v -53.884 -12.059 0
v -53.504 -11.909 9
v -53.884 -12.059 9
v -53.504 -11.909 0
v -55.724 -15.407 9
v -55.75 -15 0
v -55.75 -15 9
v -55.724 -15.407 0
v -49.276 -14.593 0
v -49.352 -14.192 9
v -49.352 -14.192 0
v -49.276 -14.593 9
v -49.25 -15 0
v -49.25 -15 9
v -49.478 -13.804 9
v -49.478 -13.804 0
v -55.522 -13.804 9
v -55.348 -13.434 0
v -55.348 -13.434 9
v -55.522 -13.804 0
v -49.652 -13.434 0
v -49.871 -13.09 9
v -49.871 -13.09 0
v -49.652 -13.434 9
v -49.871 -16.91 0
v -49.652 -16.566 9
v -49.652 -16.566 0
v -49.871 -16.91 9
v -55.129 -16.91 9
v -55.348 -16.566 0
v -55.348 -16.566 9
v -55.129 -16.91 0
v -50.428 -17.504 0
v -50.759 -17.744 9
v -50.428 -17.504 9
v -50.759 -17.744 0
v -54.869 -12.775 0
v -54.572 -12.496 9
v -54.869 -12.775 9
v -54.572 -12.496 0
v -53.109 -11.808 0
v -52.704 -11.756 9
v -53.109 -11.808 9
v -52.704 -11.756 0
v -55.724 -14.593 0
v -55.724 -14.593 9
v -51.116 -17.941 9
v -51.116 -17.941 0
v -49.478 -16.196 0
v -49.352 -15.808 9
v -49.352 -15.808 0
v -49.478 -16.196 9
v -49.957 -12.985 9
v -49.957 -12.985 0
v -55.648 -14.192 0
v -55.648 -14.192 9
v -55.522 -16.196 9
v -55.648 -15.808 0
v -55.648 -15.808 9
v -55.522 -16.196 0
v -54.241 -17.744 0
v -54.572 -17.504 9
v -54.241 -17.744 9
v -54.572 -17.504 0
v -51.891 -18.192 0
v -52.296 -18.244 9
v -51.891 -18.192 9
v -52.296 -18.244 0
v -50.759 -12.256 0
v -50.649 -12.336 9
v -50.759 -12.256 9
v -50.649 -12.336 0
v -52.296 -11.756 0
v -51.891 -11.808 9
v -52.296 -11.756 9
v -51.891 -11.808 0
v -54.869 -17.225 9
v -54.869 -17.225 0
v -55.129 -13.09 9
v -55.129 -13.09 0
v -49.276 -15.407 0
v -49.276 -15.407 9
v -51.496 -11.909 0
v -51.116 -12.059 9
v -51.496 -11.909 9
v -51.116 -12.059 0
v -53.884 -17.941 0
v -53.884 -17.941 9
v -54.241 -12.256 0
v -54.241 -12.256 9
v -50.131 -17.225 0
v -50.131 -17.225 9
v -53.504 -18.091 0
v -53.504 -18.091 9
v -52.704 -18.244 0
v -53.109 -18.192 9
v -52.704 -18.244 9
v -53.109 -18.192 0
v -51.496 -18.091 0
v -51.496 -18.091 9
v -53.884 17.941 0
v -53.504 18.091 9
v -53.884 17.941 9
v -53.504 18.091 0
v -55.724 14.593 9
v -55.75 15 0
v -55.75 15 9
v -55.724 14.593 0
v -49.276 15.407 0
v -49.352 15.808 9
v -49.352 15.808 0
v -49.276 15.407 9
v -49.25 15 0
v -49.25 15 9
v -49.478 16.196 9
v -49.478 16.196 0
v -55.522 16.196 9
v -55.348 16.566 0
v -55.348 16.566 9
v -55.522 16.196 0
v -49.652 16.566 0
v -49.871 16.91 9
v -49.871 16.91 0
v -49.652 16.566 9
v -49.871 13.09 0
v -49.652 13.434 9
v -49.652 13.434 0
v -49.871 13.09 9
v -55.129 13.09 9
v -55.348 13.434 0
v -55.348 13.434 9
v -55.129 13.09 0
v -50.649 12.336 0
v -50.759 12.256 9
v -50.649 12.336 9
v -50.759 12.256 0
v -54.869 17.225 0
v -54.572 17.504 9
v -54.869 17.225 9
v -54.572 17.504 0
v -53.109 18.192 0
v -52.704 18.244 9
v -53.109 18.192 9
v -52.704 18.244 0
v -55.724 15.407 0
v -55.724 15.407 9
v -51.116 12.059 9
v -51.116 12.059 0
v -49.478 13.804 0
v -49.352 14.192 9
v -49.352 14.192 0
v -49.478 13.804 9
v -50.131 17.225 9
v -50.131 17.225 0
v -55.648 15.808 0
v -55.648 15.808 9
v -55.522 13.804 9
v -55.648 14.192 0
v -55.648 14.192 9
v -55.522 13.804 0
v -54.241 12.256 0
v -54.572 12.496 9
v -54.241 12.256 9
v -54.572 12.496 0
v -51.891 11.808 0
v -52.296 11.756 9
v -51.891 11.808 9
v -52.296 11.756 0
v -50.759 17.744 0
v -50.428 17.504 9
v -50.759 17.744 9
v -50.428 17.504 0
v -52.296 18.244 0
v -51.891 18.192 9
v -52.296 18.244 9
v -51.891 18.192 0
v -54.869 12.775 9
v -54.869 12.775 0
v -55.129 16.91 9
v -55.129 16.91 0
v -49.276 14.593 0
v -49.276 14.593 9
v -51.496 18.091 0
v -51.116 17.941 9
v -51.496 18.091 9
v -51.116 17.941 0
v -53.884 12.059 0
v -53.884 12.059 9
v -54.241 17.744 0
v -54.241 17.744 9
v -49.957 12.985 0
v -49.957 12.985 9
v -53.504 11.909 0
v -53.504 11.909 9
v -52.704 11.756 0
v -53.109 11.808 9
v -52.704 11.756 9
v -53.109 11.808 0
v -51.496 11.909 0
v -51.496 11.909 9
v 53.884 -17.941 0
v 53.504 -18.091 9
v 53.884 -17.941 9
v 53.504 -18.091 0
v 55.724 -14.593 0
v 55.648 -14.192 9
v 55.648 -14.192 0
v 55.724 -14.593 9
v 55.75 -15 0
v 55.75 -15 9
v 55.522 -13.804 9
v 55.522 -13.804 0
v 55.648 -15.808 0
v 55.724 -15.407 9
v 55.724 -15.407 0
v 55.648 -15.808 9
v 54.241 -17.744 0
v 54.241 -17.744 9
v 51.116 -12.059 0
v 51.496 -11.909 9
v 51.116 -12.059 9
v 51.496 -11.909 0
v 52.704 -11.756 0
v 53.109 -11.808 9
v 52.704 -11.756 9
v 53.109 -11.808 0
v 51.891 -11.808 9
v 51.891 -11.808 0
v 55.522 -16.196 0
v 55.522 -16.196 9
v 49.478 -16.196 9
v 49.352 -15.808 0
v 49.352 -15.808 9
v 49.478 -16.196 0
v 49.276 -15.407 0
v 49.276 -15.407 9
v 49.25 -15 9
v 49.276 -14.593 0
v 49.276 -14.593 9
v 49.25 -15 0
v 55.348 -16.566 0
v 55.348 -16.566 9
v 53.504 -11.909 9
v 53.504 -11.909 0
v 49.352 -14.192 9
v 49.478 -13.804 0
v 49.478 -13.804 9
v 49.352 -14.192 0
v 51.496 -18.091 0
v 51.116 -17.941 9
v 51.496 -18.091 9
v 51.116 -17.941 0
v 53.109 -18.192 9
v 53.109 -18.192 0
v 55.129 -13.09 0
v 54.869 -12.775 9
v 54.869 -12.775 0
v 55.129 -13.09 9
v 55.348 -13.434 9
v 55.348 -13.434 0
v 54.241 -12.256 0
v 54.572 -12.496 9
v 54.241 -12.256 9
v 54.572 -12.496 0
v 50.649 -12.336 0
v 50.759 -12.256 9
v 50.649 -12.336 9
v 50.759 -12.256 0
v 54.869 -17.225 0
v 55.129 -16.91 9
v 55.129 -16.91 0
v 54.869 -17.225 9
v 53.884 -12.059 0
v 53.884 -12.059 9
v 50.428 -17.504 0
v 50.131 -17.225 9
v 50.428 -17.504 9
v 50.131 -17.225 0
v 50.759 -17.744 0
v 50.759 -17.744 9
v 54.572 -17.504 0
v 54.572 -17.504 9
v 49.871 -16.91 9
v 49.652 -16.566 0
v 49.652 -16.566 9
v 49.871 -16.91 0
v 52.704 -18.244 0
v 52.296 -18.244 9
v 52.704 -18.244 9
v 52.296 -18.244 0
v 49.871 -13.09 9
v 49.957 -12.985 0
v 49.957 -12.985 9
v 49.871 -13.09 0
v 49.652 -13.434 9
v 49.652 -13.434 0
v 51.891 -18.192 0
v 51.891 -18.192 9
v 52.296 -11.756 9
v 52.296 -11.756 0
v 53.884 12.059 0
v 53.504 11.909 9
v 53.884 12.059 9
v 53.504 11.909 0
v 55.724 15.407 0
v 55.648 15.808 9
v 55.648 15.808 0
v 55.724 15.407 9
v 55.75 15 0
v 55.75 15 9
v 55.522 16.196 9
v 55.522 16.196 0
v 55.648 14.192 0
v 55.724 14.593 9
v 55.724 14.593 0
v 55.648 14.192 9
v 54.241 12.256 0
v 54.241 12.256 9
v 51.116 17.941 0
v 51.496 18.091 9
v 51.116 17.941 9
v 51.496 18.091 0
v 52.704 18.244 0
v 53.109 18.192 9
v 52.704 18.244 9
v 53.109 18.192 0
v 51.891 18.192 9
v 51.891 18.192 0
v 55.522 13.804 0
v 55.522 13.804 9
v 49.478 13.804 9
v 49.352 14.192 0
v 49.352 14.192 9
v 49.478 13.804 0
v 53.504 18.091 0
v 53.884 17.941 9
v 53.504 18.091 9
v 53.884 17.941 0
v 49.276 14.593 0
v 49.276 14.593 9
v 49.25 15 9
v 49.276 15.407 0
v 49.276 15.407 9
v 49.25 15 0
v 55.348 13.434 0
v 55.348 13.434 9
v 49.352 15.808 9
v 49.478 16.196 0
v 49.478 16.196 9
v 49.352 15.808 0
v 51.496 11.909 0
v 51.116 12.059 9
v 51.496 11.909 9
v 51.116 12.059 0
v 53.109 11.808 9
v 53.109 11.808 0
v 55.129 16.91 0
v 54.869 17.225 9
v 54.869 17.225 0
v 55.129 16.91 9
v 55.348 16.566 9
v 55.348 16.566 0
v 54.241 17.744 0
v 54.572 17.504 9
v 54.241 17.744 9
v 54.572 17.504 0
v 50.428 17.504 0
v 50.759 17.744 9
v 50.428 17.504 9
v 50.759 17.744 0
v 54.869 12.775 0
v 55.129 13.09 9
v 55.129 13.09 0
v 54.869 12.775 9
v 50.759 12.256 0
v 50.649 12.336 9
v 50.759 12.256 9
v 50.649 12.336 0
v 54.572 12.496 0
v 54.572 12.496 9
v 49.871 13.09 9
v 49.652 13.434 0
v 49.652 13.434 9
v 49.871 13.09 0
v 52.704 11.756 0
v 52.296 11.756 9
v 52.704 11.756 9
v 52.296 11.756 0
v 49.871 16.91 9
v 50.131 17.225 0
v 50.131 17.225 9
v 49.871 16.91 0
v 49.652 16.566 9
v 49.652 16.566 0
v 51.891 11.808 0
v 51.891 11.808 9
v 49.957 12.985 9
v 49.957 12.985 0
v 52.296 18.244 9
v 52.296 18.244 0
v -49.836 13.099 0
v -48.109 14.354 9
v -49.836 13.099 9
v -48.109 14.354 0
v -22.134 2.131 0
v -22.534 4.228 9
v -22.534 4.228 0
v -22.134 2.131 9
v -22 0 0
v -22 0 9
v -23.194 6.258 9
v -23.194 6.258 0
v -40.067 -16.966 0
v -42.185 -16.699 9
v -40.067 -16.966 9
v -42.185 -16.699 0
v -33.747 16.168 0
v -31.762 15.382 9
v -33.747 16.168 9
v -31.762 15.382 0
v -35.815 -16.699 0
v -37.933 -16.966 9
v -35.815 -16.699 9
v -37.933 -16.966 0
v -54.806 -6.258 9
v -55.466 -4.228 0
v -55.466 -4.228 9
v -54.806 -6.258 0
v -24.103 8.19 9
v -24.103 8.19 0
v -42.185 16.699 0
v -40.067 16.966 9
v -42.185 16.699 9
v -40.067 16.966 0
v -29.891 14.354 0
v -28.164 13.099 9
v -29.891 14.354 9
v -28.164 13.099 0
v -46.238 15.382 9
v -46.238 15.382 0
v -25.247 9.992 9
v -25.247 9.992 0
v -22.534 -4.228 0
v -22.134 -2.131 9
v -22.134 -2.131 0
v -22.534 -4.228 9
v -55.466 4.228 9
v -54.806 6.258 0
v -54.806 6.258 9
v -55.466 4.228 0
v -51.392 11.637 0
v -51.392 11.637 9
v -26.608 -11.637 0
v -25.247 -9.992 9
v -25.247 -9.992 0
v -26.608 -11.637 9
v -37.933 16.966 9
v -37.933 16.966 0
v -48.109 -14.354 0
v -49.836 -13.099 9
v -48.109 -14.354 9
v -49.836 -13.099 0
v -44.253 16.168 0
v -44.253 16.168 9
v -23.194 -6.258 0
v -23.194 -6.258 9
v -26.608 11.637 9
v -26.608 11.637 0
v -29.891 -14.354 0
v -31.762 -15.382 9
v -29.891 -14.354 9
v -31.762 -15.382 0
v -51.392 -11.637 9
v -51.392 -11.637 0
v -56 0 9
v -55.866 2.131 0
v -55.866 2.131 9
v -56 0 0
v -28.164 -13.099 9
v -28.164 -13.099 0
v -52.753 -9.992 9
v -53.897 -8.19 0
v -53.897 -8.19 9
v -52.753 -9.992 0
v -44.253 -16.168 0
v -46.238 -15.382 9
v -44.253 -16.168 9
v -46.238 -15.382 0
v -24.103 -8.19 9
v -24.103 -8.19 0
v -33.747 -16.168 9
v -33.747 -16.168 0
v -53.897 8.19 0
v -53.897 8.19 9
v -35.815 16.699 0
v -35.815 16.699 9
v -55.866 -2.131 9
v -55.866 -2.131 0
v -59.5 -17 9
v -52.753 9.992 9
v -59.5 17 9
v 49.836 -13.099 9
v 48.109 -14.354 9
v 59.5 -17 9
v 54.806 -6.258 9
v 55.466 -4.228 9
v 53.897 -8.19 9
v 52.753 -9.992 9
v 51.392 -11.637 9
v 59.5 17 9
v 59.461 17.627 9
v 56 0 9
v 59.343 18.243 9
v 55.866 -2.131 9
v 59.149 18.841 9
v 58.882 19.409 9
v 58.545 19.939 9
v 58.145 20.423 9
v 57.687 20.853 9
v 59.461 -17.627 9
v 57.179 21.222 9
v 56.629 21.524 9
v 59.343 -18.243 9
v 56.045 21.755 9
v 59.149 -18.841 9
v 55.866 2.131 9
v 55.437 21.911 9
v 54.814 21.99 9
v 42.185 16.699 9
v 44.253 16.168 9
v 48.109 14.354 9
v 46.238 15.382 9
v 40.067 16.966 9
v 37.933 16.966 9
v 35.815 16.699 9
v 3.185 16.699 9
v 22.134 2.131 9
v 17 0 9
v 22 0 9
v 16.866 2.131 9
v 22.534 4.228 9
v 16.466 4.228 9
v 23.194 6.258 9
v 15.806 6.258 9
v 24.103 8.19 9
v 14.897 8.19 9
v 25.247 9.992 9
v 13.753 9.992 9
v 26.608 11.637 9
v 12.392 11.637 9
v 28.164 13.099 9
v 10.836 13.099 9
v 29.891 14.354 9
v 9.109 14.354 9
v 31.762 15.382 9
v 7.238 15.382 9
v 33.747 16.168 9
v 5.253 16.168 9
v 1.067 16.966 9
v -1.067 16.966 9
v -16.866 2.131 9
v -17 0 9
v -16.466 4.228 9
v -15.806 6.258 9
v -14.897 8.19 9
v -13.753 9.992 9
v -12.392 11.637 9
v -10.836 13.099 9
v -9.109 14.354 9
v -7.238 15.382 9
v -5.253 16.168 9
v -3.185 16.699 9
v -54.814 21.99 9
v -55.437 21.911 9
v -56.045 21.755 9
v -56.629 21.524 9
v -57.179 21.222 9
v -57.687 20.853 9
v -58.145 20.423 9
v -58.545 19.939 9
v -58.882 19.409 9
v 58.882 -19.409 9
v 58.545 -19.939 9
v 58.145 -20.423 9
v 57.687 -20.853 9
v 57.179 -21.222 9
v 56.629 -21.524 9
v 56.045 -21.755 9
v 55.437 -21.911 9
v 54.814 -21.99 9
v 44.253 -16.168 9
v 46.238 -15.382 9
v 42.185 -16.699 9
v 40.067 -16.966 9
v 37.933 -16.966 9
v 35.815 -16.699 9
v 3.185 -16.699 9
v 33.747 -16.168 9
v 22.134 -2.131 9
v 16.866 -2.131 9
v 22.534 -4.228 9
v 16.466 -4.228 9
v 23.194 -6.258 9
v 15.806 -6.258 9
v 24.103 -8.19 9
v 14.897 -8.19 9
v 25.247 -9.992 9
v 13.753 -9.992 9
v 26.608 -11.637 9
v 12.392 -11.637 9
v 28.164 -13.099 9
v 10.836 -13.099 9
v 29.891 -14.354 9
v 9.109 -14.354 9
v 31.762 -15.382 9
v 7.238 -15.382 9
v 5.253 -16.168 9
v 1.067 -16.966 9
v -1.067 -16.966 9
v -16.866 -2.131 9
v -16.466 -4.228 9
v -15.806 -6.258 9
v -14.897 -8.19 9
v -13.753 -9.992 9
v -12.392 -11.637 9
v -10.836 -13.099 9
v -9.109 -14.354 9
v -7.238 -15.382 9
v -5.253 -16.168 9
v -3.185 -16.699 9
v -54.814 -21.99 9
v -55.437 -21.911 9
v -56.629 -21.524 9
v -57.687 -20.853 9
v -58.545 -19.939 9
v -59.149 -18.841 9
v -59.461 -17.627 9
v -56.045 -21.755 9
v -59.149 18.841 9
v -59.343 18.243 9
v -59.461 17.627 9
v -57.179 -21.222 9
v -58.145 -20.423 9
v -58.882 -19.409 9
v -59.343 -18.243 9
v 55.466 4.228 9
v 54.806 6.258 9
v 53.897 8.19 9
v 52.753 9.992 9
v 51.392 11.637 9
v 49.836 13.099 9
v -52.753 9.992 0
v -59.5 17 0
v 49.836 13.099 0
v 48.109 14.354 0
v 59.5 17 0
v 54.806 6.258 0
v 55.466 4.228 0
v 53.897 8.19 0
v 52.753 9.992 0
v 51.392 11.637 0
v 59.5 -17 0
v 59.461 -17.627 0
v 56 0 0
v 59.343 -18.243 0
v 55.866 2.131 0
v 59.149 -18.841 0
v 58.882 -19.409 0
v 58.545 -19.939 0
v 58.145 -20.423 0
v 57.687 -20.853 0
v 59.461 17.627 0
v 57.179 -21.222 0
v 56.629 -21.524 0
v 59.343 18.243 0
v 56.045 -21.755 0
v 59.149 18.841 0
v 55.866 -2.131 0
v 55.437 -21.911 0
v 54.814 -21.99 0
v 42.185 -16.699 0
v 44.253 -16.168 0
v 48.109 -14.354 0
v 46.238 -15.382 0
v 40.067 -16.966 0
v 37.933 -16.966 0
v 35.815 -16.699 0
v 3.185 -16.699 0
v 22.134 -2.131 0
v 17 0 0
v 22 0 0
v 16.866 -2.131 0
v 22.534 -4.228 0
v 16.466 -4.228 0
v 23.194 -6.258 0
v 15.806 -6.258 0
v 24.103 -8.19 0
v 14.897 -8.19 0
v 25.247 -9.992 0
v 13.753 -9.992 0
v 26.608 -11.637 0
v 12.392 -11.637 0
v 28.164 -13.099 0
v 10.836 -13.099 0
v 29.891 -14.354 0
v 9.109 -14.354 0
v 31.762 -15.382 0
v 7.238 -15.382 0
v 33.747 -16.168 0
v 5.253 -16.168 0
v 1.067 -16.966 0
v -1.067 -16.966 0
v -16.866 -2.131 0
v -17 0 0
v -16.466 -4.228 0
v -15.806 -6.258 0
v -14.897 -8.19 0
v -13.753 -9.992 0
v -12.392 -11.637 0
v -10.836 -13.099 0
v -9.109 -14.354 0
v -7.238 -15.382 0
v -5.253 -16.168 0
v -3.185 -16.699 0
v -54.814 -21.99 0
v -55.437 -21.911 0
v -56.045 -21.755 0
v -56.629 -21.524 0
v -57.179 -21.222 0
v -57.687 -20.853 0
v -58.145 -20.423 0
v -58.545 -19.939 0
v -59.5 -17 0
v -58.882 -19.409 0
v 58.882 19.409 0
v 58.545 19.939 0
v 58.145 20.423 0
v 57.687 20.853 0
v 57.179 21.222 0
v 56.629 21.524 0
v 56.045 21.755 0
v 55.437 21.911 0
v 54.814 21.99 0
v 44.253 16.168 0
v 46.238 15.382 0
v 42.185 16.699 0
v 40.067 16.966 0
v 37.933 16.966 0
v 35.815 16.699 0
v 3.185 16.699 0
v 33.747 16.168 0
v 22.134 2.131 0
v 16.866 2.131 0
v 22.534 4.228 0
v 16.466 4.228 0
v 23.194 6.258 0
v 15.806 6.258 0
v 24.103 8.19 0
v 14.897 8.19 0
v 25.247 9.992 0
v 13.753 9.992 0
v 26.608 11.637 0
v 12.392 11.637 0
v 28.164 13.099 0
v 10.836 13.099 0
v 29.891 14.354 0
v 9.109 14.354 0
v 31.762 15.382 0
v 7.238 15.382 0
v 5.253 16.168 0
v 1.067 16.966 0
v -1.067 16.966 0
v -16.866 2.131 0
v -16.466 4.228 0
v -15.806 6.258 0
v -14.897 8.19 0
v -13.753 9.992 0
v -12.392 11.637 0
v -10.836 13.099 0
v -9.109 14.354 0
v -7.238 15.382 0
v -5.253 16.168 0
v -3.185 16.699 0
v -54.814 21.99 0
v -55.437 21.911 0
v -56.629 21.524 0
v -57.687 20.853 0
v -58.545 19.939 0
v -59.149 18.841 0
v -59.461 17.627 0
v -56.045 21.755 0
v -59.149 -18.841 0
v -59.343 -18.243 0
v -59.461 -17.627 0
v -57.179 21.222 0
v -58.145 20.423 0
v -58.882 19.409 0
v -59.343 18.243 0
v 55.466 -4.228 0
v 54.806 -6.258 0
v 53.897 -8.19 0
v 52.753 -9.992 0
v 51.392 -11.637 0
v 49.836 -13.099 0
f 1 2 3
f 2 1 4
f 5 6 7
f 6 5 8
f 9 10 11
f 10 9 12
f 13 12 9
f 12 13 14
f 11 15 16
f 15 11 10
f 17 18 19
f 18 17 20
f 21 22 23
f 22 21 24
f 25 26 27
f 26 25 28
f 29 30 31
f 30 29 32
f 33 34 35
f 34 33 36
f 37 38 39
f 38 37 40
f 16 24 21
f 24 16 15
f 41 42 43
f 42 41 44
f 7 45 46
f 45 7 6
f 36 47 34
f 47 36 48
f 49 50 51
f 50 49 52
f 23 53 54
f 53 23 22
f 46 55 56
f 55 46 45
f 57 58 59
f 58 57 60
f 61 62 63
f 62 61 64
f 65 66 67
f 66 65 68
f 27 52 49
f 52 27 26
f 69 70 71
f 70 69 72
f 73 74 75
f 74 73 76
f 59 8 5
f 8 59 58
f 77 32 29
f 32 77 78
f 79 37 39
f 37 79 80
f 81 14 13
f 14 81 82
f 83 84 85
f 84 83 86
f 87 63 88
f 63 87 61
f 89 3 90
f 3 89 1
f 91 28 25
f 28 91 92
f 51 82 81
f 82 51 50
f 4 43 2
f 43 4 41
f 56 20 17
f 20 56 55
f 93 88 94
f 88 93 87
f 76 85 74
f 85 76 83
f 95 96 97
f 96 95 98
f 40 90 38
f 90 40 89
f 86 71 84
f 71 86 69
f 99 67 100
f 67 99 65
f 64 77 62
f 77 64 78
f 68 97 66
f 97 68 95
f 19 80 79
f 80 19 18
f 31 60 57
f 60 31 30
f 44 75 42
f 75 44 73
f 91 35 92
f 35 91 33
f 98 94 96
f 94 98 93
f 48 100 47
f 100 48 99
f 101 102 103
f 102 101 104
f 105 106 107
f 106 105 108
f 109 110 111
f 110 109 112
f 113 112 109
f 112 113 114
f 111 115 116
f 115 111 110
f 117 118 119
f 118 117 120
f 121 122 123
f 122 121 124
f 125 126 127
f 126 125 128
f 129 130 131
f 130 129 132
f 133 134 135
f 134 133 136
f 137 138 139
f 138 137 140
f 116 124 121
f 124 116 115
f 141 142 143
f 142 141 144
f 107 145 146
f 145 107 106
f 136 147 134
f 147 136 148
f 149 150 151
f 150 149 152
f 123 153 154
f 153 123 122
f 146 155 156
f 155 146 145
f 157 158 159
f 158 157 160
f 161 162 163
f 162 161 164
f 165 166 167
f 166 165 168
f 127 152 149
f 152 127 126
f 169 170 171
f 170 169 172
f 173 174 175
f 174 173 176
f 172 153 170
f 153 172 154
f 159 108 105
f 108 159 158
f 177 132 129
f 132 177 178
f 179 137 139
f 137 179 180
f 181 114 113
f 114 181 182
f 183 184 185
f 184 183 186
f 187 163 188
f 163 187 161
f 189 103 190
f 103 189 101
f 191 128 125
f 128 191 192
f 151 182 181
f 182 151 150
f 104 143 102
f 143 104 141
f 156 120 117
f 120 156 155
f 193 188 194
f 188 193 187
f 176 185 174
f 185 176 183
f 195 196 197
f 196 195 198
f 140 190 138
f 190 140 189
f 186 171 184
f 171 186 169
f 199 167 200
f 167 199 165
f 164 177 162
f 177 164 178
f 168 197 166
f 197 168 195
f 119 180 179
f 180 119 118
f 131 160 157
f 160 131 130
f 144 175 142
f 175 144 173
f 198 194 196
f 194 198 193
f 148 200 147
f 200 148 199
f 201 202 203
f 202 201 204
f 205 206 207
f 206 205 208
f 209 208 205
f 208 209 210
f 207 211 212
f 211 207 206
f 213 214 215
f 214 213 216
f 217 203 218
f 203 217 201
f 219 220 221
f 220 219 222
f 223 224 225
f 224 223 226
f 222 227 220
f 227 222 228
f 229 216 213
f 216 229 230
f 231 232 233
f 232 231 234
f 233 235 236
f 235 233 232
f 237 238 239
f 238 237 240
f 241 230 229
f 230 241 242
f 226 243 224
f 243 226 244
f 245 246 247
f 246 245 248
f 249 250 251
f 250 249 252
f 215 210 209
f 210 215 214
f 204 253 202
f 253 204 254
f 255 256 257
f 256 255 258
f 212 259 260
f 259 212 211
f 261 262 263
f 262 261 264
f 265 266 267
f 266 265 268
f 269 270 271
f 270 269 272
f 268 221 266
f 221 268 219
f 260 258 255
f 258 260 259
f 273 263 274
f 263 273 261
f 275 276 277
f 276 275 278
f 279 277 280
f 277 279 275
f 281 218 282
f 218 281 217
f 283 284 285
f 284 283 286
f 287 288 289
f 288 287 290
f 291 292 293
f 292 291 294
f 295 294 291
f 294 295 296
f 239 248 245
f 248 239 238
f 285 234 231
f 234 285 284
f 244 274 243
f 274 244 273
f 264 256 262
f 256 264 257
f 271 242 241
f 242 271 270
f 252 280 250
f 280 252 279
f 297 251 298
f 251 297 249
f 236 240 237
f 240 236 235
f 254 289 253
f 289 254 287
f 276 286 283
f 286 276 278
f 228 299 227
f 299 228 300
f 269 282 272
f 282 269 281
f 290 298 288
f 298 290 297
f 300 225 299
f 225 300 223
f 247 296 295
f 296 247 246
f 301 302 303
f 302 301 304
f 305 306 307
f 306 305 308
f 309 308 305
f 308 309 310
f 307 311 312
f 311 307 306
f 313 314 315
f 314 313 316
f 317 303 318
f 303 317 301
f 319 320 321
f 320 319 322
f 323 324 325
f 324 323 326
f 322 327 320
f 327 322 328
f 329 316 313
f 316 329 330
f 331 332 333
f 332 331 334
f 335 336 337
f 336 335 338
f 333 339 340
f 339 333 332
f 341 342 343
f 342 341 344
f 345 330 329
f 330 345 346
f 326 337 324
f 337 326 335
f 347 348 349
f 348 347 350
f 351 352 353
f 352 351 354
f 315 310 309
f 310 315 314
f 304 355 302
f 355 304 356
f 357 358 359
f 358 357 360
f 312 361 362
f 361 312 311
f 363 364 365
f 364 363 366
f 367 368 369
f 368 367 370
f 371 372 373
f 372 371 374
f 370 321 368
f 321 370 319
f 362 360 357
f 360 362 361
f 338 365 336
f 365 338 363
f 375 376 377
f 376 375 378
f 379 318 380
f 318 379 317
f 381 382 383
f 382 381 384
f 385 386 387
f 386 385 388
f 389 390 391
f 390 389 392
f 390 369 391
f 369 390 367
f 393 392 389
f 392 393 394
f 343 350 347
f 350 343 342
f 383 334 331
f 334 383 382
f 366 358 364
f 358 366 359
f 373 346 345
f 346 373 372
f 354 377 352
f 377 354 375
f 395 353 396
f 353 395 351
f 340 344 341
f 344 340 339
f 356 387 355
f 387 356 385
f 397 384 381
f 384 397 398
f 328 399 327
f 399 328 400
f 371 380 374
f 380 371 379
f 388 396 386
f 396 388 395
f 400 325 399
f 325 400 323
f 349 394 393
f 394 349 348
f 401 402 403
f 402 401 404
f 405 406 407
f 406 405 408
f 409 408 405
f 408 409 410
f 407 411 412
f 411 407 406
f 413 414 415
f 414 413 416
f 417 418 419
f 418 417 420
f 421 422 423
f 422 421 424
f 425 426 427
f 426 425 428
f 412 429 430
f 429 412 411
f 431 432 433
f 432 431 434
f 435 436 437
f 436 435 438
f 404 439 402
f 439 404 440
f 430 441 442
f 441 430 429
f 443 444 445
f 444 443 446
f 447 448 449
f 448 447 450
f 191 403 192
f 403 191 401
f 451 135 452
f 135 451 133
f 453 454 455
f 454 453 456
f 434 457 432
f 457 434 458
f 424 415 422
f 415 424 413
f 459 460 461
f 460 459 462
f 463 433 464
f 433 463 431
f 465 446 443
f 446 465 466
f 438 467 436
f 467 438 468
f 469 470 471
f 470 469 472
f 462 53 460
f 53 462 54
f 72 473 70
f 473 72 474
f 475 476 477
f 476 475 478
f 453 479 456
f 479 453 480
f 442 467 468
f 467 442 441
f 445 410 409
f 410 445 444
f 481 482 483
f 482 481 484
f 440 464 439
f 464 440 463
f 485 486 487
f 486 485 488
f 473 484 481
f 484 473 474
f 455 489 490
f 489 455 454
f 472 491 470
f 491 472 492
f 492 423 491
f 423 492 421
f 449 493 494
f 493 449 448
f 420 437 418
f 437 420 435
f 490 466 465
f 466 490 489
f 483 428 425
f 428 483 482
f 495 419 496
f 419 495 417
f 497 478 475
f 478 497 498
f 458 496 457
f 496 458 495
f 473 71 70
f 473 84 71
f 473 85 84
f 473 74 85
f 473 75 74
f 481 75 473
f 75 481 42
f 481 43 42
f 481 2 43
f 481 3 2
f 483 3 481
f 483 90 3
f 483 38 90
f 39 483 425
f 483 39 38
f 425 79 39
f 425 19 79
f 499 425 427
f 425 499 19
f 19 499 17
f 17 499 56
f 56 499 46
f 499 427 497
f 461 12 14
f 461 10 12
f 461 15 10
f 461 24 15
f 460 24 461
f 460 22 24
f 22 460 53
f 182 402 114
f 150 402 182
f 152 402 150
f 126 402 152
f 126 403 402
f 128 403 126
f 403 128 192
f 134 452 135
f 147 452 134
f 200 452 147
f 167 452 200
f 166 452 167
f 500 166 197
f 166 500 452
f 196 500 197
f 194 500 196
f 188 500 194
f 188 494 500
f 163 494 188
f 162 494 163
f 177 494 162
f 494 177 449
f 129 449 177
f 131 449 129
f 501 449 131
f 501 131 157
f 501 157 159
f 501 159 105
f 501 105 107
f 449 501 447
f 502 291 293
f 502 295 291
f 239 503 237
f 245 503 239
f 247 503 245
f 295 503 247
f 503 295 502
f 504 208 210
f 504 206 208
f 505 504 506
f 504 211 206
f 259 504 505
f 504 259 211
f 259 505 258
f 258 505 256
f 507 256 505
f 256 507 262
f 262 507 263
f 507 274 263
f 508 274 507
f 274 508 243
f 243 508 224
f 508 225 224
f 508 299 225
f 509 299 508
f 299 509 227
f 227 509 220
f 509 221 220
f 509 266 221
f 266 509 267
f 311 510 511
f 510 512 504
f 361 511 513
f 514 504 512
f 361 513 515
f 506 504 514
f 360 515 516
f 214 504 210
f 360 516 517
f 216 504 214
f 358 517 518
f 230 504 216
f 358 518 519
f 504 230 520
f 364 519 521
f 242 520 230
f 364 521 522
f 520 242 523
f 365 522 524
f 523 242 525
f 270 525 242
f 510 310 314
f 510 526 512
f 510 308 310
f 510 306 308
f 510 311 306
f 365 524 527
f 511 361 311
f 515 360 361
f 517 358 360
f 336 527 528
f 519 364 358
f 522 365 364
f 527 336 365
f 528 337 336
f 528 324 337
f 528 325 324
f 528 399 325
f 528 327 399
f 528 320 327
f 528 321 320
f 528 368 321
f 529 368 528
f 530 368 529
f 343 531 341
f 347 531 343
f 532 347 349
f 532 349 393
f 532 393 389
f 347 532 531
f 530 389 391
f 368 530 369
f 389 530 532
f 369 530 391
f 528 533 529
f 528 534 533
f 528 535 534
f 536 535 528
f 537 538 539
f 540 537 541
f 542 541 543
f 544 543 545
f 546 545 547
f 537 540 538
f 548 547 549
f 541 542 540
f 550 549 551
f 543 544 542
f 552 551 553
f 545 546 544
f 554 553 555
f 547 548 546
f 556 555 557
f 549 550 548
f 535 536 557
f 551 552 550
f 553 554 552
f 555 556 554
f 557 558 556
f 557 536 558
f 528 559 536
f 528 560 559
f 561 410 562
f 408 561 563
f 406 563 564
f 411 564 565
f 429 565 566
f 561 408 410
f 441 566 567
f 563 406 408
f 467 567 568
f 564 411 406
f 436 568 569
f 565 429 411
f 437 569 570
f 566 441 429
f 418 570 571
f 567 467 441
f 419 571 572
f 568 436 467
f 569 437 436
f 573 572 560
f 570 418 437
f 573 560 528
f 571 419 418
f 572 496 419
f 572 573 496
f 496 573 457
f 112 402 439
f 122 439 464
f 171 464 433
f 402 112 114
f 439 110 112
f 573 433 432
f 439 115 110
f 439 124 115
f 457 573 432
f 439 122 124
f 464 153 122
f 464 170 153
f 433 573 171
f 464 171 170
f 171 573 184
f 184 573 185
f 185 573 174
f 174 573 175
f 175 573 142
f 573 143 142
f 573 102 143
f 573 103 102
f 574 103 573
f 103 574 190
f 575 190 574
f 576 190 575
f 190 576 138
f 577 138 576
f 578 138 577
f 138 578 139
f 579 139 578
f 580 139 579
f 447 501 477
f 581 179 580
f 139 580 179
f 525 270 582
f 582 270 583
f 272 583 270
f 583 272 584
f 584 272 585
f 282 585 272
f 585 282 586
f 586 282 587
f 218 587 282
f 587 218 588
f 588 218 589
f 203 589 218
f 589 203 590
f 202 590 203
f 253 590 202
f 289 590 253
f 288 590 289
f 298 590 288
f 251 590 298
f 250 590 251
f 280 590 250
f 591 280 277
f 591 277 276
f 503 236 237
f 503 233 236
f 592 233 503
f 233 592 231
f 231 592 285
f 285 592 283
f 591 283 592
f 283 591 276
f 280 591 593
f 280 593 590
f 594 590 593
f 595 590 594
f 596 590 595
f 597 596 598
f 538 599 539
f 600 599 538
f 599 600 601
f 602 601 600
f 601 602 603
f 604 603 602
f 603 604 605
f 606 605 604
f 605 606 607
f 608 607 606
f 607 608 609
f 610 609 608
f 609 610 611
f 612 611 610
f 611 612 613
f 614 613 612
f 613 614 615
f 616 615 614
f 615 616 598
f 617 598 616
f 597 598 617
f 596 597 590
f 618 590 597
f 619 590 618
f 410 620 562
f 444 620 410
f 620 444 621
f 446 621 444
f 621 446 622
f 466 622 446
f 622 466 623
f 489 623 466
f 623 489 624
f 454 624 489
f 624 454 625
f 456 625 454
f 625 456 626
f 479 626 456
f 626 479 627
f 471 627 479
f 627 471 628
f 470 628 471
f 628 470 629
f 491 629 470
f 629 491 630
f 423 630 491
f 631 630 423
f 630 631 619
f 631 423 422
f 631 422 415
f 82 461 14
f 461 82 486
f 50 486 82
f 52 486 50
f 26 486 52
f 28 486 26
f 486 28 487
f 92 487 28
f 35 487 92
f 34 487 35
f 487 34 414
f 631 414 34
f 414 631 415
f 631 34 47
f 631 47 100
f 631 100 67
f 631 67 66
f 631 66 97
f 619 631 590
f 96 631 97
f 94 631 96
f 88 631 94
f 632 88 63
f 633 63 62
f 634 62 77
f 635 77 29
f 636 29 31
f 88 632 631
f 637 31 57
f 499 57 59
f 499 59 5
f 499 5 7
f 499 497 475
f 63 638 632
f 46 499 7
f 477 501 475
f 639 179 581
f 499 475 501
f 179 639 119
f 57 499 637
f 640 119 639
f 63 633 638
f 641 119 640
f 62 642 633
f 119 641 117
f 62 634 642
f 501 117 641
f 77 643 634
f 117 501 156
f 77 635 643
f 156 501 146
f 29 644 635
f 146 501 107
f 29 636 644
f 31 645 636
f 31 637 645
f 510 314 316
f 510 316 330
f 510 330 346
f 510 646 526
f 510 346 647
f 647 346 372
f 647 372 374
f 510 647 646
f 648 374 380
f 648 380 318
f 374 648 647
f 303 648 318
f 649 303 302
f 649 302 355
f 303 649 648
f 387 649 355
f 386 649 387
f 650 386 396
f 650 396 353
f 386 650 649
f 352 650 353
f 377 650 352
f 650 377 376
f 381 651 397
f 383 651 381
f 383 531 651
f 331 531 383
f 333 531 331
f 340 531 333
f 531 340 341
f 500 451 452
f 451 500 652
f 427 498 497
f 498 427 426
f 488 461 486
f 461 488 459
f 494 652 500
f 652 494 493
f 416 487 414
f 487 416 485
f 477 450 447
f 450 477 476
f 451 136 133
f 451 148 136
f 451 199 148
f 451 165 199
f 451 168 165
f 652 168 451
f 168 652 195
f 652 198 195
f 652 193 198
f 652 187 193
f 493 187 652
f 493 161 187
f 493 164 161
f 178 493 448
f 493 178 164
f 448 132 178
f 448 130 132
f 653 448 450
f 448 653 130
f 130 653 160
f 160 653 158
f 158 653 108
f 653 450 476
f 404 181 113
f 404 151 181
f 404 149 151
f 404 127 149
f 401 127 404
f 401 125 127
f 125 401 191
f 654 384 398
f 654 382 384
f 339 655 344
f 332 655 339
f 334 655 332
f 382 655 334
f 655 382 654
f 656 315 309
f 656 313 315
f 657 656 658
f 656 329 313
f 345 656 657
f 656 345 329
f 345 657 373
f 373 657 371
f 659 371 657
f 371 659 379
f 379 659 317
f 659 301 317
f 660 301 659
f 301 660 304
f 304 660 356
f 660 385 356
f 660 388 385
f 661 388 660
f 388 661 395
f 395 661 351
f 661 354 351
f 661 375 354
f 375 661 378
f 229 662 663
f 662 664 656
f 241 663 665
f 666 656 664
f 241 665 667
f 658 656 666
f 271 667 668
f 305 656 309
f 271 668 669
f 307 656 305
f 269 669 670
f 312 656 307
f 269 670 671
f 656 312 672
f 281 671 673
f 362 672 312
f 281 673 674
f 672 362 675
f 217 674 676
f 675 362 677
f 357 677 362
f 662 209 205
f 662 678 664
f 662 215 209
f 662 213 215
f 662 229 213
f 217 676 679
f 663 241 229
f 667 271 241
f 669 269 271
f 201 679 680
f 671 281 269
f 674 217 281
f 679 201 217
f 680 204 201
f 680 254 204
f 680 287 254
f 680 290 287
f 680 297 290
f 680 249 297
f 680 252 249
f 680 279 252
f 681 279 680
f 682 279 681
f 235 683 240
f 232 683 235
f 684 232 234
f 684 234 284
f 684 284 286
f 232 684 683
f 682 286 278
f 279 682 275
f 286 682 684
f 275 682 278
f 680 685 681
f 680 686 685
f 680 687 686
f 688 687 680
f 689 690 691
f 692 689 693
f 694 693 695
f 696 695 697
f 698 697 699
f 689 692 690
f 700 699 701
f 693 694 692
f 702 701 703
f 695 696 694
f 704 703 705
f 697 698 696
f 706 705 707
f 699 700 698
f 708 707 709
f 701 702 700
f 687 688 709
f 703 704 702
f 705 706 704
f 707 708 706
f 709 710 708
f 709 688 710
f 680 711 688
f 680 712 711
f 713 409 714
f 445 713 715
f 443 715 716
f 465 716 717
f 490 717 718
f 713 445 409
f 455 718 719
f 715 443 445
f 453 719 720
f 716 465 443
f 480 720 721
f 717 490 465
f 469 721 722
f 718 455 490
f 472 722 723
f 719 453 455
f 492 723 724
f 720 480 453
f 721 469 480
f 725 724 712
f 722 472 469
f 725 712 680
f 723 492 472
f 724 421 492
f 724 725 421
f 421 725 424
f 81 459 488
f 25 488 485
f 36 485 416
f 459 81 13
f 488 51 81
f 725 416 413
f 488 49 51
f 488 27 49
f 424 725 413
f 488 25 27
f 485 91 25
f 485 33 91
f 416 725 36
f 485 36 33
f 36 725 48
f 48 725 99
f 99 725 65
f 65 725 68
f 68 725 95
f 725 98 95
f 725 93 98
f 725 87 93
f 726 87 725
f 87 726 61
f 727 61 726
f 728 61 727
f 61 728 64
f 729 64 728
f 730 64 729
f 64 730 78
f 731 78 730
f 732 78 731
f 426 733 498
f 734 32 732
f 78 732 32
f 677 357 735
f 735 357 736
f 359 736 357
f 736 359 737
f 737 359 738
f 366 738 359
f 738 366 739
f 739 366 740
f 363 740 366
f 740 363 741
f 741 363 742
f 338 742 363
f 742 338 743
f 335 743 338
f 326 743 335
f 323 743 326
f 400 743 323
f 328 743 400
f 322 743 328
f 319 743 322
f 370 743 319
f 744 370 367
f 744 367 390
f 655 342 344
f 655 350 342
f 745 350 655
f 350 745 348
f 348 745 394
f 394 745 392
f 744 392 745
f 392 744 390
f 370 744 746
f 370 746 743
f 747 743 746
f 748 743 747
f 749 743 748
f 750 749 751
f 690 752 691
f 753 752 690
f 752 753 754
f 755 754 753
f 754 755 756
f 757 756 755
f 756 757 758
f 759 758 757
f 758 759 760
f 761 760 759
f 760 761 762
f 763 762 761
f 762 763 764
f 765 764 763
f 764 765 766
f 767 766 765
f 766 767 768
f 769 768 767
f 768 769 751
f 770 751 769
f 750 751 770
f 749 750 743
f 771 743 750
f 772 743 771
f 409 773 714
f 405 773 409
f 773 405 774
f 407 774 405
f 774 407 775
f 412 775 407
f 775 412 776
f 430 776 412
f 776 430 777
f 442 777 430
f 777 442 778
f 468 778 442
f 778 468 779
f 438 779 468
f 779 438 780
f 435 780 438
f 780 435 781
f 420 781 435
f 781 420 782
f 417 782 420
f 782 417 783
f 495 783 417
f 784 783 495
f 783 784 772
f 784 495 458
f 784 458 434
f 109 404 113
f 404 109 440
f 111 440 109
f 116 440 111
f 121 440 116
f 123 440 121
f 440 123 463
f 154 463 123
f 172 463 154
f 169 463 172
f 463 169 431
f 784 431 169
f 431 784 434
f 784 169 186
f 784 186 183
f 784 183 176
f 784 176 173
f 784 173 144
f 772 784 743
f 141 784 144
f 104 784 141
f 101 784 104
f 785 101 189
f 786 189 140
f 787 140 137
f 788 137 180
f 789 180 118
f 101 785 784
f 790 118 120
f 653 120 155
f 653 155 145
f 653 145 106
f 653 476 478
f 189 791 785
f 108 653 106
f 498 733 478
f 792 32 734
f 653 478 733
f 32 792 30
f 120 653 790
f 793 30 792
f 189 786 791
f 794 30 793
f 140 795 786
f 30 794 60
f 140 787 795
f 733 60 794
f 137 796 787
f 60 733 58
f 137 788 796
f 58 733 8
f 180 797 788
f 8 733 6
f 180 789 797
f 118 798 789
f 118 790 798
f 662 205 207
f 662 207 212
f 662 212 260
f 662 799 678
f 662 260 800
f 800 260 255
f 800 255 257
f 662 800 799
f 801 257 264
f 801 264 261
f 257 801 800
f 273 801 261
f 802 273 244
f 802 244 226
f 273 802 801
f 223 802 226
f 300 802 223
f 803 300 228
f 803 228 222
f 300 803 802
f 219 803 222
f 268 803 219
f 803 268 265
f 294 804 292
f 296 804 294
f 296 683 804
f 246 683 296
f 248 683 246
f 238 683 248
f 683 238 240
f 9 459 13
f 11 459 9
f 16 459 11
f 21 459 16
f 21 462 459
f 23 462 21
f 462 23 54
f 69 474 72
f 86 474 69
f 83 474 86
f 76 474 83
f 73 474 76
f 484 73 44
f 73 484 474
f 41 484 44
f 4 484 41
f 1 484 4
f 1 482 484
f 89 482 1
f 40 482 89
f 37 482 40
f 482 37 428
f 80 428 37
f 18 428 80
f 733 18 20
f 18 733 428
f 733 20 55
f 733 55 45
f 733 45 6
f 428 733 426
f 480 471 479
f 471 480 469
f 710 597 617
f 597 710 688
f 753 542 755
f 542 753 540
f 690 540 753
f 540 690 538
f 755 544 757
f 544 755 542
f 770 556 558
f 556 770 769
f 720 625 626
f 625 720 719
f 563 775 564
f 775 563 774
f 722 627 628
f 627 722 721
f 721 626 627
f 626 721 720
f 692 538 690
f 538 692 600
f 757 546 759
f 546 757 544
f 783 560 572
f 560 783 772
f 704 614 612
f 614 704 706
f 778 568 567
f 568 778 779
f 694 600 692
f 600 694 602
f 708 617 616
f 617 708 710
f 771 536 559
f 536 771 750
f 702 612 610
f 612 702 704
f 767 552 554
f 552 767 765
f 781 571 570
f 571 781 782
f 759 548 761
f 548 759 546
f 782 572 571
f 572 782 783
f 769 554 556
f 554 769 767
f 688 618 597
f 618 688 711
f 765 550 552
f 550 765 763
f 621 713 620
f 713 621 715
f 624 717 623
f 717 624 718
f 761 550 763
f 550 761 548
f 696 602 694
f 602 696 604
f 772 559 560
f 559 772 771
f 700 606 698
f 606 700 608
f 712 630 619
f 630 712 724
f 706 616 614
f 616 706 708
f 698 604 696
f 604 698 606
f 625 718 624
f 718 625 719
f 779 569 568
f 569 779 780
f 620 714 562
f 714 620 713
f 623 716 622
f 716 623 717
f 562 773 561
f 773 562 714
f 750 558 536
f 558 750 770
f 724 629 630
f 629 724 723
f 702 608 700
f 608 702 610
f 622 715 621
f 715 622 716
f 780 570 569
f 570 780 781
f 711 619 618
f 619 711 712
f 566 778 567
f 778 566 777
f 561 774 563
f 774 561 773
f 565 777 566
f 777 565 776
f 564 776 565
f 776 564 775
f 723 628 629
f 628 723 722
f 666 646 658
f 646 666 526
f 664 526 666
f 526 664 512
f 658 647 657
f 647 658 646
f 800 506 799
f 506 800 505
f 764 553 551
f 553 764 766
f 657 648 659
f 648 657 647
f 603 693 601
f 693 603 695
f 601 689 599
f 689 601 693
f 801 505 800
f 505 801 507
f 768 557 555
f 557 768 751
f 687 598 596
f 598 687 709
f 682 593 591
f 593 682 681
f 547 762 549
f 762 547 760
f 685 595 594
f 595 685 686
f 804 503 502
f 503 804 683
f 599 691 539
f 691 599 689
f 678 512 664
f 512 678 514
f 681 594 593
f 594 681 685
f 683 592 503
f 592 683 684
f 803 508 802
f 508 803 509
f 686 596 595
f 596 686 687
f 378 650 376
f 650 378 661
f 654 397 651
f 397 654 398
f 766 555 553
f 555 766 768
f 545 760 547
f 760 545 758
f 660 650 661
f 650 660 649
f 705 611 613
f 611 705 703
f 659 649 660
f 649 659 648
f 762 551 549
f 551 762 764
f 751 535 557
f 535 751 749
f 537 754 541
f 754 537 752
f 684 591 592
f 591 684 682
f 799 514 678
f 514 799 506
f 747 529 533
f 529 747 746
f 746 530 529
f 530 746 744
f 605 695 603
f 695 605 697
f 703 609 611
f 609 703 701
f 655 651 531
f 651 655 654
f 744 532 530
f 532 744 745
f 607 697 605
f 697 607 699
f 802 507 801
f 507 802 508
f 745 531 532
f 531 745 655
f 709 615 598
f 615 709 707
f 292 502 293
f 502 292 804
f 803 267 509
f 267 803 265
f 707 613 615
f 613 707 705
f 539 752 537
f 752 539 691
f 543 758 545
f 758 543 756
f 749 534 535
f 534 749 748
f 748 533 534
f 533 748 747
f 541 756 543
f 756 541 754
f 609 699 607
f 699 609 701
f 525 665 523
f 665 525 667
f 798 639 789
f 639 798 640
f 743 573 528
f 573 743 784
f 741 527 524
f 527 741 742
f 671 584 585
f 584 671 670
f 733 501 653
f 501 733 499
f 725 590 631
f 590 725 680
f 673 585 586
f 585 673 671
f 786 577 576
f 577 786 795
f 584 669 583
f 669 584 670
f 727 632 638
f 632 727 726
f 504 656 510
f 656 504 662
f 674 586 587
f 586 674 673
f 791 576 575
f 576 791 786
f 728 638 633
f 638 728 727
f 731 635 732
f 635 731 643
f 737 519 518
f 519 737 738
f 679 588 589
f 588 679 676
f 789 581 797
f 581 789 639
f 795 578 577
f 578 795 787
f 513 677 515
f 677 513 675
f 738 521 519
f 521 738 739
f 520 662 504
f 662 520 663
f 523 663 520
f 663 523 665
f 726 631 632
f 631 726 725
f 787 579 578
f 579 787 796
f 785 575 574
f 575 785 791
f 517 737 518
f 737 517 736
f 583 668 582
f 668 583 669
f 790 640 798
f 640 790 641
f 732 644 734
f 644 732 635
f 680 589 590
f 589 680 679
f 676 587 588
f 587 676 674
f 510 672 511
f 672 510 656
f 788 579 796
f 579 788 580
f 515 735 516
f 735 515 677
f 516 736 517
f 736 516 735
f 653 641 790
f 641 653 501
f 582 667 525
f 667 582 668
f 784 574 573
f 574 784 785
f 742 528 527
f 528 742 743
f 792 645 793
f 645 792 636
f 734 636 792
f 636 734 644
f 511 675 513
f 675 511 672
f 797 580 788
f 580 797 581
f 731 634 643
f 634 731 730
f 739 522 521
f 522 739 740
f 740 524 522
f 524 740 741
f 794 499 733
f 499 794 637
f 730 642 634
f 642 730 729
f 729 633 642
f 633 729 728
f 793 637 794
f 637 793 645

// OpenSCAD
$fn = 50;


difference() {
	union() {
		hull() {
			translate(v = [-54.5000000000, 17.0000000000, 0]) {
				cylinder(h = 9, r = 5);
			}
			translate(v = [54.5000000000, 17.0000000000, 0]) {
				cylinder(h = 9, r = 5);
			}
			translate(v = [-54.5000000000, -17.0000000000, 0]) {
				cylinder(h = 9, r = 5);
			}
			translate(v = [54.5000000000, -17.0000000000, 0]) {
				cylinder(h = 9, r = 5);
			}
		}
	}
	union() {
		#translate(v = [-52.5000000000, -15.0000000000, -100.0000000000]) {
			cylinder(h = 200, r = 3.2500000000);
		}
		#translate(v = [-52.5000000000, 15.0000000000, -100.0000000000]) {
			cylinder(h = 200, r = 3.2500000000);
		}
		#translate(v = [52.5000000000, -15.0000000000, -100.0000000000]) {
			cylinder(h = 200, r = 3.2500000000);
		}
		#translate(v = [52.5000000000, 15.0000000000, -100.0000000000]) {
			cylinder(h = 200, r = 3.2500000000);
		}
		#translate(v = [-39.0000000000, 0, 0]) {
			cylinder(h = 9, r = 17.0000000000);
		}
		#cylinder(h = 9, r = 17.0000000000);
		#translate(v = [39.0000000000, 0, 0]) {
			cylinder(h = 9, r = 17.0000000000);
		}
	}
}
